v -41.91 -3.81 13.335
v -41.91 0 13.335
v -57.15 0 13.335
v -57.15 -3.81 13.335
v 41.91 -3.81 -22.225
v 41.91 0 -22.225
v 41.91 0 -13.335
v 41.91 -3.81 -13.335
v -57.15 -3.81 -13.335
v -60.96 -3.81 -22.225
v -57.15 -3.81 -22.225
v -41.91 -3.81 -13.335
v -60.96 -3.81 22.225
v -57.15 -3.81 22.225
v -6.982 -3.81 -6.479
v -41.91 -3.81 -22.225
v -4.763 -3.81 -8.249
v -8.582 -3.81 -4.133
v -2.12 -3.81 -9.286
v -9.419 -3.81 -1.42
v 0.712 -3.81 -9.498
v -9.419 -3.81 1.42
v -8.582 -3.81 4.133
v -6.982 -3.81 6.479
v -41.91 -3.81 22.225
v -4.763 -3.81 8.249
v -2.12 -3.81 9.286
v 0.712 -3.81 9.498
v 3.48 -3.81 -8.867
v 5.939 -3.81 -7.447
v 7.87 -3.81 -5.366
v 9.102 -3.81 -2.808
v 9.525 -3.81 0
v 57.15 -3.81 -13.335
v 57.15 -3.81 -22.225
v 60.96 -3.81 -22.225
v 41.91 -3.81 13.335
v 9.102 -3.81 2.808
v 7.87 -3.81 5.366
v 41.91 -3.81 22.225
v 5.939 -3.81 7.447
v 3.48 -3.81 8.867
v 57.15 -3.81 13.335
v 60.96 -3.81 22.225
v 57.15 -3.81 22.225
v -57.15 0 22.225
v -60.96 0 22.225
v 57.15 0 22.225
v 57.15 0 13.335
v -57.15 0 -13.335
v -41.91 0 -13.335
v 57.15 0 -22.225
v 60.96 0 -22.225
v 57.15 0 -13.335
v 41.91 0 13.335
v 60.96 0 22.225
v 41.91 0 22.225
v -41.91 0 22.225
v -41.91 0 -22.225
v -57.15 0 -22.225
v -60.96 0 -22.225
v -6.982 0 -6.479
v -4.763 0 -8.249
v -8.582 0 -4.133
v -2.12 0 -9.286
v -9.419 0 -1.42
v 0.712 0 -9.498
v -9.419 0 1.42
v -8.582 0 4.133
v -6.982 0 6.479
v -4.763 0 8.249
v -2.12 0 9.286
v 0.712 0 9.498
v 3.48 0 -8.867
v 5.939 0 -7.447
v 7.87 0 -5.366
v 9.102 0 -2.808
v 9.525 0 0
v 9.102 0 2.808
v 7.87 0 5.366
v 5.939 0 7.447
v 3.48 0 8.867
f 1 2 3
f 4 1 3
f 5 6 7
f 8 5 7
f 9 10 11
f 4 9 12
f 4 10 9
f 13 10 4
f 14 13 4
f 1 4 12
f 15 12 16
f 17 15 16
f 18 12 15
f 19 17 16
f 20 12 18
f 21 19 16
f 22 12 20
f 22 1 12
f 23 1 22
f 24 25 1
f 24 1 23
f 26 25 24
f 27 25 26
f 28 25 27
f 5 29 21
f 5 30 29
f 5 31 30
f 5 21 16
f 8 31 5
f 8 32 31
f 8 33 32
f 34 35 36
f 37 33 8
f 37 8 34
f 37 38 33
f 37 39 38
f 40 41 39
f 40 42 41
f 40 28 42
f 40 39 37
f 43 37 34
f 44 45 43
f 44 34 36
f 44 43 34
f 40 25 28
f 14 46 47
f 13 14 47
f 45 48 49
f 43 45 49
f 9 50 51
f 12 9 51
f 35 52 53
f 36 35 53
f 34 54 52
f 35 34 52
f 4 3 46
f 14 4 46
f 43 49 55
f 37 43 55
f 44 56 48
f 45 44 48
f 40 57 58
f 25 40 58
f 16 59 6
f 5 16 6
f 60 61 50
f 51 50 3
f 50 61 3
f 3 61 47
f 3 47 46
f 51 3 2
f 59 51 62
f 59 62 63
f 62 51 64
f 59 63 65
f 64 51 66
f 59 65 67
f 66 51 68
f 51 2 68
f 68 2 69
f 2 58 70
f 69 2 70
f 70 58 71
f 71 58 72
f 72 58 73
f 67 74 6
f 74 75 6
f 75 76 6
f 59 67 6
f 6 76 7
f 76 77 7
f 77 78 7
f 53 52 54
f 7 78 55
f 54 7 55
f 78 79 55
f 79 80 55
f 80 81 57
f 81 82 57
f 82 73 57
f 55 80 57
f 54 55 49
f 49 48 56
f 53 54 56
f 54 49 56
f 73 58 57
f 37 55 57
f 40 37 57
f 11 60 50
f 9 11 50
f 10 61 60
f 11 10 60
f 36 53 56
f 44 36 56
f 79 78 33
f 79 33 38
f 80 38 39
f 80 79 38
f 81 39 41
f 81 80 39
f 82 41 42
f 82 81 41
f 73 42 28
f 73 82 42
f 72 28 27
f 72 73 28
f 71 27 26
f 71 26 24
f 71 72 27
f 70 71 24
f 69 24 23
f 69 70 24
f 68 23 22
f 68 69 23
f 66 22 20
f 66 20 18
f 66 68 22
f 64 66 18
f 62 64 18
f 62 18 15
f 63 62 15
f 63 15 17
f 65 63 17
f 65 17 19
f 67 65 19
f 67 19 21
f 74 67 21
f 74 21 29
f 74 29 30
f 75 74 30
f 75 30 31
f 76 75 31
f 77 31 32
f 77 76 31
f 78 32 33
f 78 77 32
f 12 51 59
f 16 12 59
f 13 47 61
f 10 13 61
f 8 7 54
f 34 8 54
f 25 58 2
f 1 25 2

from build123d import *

# Parameters (mm, degrees)
F0_R     = 9.525
F1_DEPTH = 3.81


with BuildPart() as f1:
    # F0 (on Front) → F1 (new body)
    with BuildSketch(Plane.XZ):
        Polygon((57.15, -22.225), (60.96, -22.225), (60.96, 22.225), (57.15, 22.225), (57.15, 13.335), (41.91, 13.335), (41.91, 22.225), (-41.91, 22.225), (-41.91, 13.335), (-57.15, 13.335), (-57.15, 22.225), (-60.96, 22.225), (-60.96, -22.225), (-57.15, -22.225), (-57.15, -13.335), (-41.91, -13.335), (-41.91, -22.225), (41.91, -22.225), (41.91, -13.335), (57.15, -13.335), align=None)
        Circle(F0_R, mode=Mode.SUBTRACT)
    extrude(amount=F1_DEPTH)


solid = f1.part
